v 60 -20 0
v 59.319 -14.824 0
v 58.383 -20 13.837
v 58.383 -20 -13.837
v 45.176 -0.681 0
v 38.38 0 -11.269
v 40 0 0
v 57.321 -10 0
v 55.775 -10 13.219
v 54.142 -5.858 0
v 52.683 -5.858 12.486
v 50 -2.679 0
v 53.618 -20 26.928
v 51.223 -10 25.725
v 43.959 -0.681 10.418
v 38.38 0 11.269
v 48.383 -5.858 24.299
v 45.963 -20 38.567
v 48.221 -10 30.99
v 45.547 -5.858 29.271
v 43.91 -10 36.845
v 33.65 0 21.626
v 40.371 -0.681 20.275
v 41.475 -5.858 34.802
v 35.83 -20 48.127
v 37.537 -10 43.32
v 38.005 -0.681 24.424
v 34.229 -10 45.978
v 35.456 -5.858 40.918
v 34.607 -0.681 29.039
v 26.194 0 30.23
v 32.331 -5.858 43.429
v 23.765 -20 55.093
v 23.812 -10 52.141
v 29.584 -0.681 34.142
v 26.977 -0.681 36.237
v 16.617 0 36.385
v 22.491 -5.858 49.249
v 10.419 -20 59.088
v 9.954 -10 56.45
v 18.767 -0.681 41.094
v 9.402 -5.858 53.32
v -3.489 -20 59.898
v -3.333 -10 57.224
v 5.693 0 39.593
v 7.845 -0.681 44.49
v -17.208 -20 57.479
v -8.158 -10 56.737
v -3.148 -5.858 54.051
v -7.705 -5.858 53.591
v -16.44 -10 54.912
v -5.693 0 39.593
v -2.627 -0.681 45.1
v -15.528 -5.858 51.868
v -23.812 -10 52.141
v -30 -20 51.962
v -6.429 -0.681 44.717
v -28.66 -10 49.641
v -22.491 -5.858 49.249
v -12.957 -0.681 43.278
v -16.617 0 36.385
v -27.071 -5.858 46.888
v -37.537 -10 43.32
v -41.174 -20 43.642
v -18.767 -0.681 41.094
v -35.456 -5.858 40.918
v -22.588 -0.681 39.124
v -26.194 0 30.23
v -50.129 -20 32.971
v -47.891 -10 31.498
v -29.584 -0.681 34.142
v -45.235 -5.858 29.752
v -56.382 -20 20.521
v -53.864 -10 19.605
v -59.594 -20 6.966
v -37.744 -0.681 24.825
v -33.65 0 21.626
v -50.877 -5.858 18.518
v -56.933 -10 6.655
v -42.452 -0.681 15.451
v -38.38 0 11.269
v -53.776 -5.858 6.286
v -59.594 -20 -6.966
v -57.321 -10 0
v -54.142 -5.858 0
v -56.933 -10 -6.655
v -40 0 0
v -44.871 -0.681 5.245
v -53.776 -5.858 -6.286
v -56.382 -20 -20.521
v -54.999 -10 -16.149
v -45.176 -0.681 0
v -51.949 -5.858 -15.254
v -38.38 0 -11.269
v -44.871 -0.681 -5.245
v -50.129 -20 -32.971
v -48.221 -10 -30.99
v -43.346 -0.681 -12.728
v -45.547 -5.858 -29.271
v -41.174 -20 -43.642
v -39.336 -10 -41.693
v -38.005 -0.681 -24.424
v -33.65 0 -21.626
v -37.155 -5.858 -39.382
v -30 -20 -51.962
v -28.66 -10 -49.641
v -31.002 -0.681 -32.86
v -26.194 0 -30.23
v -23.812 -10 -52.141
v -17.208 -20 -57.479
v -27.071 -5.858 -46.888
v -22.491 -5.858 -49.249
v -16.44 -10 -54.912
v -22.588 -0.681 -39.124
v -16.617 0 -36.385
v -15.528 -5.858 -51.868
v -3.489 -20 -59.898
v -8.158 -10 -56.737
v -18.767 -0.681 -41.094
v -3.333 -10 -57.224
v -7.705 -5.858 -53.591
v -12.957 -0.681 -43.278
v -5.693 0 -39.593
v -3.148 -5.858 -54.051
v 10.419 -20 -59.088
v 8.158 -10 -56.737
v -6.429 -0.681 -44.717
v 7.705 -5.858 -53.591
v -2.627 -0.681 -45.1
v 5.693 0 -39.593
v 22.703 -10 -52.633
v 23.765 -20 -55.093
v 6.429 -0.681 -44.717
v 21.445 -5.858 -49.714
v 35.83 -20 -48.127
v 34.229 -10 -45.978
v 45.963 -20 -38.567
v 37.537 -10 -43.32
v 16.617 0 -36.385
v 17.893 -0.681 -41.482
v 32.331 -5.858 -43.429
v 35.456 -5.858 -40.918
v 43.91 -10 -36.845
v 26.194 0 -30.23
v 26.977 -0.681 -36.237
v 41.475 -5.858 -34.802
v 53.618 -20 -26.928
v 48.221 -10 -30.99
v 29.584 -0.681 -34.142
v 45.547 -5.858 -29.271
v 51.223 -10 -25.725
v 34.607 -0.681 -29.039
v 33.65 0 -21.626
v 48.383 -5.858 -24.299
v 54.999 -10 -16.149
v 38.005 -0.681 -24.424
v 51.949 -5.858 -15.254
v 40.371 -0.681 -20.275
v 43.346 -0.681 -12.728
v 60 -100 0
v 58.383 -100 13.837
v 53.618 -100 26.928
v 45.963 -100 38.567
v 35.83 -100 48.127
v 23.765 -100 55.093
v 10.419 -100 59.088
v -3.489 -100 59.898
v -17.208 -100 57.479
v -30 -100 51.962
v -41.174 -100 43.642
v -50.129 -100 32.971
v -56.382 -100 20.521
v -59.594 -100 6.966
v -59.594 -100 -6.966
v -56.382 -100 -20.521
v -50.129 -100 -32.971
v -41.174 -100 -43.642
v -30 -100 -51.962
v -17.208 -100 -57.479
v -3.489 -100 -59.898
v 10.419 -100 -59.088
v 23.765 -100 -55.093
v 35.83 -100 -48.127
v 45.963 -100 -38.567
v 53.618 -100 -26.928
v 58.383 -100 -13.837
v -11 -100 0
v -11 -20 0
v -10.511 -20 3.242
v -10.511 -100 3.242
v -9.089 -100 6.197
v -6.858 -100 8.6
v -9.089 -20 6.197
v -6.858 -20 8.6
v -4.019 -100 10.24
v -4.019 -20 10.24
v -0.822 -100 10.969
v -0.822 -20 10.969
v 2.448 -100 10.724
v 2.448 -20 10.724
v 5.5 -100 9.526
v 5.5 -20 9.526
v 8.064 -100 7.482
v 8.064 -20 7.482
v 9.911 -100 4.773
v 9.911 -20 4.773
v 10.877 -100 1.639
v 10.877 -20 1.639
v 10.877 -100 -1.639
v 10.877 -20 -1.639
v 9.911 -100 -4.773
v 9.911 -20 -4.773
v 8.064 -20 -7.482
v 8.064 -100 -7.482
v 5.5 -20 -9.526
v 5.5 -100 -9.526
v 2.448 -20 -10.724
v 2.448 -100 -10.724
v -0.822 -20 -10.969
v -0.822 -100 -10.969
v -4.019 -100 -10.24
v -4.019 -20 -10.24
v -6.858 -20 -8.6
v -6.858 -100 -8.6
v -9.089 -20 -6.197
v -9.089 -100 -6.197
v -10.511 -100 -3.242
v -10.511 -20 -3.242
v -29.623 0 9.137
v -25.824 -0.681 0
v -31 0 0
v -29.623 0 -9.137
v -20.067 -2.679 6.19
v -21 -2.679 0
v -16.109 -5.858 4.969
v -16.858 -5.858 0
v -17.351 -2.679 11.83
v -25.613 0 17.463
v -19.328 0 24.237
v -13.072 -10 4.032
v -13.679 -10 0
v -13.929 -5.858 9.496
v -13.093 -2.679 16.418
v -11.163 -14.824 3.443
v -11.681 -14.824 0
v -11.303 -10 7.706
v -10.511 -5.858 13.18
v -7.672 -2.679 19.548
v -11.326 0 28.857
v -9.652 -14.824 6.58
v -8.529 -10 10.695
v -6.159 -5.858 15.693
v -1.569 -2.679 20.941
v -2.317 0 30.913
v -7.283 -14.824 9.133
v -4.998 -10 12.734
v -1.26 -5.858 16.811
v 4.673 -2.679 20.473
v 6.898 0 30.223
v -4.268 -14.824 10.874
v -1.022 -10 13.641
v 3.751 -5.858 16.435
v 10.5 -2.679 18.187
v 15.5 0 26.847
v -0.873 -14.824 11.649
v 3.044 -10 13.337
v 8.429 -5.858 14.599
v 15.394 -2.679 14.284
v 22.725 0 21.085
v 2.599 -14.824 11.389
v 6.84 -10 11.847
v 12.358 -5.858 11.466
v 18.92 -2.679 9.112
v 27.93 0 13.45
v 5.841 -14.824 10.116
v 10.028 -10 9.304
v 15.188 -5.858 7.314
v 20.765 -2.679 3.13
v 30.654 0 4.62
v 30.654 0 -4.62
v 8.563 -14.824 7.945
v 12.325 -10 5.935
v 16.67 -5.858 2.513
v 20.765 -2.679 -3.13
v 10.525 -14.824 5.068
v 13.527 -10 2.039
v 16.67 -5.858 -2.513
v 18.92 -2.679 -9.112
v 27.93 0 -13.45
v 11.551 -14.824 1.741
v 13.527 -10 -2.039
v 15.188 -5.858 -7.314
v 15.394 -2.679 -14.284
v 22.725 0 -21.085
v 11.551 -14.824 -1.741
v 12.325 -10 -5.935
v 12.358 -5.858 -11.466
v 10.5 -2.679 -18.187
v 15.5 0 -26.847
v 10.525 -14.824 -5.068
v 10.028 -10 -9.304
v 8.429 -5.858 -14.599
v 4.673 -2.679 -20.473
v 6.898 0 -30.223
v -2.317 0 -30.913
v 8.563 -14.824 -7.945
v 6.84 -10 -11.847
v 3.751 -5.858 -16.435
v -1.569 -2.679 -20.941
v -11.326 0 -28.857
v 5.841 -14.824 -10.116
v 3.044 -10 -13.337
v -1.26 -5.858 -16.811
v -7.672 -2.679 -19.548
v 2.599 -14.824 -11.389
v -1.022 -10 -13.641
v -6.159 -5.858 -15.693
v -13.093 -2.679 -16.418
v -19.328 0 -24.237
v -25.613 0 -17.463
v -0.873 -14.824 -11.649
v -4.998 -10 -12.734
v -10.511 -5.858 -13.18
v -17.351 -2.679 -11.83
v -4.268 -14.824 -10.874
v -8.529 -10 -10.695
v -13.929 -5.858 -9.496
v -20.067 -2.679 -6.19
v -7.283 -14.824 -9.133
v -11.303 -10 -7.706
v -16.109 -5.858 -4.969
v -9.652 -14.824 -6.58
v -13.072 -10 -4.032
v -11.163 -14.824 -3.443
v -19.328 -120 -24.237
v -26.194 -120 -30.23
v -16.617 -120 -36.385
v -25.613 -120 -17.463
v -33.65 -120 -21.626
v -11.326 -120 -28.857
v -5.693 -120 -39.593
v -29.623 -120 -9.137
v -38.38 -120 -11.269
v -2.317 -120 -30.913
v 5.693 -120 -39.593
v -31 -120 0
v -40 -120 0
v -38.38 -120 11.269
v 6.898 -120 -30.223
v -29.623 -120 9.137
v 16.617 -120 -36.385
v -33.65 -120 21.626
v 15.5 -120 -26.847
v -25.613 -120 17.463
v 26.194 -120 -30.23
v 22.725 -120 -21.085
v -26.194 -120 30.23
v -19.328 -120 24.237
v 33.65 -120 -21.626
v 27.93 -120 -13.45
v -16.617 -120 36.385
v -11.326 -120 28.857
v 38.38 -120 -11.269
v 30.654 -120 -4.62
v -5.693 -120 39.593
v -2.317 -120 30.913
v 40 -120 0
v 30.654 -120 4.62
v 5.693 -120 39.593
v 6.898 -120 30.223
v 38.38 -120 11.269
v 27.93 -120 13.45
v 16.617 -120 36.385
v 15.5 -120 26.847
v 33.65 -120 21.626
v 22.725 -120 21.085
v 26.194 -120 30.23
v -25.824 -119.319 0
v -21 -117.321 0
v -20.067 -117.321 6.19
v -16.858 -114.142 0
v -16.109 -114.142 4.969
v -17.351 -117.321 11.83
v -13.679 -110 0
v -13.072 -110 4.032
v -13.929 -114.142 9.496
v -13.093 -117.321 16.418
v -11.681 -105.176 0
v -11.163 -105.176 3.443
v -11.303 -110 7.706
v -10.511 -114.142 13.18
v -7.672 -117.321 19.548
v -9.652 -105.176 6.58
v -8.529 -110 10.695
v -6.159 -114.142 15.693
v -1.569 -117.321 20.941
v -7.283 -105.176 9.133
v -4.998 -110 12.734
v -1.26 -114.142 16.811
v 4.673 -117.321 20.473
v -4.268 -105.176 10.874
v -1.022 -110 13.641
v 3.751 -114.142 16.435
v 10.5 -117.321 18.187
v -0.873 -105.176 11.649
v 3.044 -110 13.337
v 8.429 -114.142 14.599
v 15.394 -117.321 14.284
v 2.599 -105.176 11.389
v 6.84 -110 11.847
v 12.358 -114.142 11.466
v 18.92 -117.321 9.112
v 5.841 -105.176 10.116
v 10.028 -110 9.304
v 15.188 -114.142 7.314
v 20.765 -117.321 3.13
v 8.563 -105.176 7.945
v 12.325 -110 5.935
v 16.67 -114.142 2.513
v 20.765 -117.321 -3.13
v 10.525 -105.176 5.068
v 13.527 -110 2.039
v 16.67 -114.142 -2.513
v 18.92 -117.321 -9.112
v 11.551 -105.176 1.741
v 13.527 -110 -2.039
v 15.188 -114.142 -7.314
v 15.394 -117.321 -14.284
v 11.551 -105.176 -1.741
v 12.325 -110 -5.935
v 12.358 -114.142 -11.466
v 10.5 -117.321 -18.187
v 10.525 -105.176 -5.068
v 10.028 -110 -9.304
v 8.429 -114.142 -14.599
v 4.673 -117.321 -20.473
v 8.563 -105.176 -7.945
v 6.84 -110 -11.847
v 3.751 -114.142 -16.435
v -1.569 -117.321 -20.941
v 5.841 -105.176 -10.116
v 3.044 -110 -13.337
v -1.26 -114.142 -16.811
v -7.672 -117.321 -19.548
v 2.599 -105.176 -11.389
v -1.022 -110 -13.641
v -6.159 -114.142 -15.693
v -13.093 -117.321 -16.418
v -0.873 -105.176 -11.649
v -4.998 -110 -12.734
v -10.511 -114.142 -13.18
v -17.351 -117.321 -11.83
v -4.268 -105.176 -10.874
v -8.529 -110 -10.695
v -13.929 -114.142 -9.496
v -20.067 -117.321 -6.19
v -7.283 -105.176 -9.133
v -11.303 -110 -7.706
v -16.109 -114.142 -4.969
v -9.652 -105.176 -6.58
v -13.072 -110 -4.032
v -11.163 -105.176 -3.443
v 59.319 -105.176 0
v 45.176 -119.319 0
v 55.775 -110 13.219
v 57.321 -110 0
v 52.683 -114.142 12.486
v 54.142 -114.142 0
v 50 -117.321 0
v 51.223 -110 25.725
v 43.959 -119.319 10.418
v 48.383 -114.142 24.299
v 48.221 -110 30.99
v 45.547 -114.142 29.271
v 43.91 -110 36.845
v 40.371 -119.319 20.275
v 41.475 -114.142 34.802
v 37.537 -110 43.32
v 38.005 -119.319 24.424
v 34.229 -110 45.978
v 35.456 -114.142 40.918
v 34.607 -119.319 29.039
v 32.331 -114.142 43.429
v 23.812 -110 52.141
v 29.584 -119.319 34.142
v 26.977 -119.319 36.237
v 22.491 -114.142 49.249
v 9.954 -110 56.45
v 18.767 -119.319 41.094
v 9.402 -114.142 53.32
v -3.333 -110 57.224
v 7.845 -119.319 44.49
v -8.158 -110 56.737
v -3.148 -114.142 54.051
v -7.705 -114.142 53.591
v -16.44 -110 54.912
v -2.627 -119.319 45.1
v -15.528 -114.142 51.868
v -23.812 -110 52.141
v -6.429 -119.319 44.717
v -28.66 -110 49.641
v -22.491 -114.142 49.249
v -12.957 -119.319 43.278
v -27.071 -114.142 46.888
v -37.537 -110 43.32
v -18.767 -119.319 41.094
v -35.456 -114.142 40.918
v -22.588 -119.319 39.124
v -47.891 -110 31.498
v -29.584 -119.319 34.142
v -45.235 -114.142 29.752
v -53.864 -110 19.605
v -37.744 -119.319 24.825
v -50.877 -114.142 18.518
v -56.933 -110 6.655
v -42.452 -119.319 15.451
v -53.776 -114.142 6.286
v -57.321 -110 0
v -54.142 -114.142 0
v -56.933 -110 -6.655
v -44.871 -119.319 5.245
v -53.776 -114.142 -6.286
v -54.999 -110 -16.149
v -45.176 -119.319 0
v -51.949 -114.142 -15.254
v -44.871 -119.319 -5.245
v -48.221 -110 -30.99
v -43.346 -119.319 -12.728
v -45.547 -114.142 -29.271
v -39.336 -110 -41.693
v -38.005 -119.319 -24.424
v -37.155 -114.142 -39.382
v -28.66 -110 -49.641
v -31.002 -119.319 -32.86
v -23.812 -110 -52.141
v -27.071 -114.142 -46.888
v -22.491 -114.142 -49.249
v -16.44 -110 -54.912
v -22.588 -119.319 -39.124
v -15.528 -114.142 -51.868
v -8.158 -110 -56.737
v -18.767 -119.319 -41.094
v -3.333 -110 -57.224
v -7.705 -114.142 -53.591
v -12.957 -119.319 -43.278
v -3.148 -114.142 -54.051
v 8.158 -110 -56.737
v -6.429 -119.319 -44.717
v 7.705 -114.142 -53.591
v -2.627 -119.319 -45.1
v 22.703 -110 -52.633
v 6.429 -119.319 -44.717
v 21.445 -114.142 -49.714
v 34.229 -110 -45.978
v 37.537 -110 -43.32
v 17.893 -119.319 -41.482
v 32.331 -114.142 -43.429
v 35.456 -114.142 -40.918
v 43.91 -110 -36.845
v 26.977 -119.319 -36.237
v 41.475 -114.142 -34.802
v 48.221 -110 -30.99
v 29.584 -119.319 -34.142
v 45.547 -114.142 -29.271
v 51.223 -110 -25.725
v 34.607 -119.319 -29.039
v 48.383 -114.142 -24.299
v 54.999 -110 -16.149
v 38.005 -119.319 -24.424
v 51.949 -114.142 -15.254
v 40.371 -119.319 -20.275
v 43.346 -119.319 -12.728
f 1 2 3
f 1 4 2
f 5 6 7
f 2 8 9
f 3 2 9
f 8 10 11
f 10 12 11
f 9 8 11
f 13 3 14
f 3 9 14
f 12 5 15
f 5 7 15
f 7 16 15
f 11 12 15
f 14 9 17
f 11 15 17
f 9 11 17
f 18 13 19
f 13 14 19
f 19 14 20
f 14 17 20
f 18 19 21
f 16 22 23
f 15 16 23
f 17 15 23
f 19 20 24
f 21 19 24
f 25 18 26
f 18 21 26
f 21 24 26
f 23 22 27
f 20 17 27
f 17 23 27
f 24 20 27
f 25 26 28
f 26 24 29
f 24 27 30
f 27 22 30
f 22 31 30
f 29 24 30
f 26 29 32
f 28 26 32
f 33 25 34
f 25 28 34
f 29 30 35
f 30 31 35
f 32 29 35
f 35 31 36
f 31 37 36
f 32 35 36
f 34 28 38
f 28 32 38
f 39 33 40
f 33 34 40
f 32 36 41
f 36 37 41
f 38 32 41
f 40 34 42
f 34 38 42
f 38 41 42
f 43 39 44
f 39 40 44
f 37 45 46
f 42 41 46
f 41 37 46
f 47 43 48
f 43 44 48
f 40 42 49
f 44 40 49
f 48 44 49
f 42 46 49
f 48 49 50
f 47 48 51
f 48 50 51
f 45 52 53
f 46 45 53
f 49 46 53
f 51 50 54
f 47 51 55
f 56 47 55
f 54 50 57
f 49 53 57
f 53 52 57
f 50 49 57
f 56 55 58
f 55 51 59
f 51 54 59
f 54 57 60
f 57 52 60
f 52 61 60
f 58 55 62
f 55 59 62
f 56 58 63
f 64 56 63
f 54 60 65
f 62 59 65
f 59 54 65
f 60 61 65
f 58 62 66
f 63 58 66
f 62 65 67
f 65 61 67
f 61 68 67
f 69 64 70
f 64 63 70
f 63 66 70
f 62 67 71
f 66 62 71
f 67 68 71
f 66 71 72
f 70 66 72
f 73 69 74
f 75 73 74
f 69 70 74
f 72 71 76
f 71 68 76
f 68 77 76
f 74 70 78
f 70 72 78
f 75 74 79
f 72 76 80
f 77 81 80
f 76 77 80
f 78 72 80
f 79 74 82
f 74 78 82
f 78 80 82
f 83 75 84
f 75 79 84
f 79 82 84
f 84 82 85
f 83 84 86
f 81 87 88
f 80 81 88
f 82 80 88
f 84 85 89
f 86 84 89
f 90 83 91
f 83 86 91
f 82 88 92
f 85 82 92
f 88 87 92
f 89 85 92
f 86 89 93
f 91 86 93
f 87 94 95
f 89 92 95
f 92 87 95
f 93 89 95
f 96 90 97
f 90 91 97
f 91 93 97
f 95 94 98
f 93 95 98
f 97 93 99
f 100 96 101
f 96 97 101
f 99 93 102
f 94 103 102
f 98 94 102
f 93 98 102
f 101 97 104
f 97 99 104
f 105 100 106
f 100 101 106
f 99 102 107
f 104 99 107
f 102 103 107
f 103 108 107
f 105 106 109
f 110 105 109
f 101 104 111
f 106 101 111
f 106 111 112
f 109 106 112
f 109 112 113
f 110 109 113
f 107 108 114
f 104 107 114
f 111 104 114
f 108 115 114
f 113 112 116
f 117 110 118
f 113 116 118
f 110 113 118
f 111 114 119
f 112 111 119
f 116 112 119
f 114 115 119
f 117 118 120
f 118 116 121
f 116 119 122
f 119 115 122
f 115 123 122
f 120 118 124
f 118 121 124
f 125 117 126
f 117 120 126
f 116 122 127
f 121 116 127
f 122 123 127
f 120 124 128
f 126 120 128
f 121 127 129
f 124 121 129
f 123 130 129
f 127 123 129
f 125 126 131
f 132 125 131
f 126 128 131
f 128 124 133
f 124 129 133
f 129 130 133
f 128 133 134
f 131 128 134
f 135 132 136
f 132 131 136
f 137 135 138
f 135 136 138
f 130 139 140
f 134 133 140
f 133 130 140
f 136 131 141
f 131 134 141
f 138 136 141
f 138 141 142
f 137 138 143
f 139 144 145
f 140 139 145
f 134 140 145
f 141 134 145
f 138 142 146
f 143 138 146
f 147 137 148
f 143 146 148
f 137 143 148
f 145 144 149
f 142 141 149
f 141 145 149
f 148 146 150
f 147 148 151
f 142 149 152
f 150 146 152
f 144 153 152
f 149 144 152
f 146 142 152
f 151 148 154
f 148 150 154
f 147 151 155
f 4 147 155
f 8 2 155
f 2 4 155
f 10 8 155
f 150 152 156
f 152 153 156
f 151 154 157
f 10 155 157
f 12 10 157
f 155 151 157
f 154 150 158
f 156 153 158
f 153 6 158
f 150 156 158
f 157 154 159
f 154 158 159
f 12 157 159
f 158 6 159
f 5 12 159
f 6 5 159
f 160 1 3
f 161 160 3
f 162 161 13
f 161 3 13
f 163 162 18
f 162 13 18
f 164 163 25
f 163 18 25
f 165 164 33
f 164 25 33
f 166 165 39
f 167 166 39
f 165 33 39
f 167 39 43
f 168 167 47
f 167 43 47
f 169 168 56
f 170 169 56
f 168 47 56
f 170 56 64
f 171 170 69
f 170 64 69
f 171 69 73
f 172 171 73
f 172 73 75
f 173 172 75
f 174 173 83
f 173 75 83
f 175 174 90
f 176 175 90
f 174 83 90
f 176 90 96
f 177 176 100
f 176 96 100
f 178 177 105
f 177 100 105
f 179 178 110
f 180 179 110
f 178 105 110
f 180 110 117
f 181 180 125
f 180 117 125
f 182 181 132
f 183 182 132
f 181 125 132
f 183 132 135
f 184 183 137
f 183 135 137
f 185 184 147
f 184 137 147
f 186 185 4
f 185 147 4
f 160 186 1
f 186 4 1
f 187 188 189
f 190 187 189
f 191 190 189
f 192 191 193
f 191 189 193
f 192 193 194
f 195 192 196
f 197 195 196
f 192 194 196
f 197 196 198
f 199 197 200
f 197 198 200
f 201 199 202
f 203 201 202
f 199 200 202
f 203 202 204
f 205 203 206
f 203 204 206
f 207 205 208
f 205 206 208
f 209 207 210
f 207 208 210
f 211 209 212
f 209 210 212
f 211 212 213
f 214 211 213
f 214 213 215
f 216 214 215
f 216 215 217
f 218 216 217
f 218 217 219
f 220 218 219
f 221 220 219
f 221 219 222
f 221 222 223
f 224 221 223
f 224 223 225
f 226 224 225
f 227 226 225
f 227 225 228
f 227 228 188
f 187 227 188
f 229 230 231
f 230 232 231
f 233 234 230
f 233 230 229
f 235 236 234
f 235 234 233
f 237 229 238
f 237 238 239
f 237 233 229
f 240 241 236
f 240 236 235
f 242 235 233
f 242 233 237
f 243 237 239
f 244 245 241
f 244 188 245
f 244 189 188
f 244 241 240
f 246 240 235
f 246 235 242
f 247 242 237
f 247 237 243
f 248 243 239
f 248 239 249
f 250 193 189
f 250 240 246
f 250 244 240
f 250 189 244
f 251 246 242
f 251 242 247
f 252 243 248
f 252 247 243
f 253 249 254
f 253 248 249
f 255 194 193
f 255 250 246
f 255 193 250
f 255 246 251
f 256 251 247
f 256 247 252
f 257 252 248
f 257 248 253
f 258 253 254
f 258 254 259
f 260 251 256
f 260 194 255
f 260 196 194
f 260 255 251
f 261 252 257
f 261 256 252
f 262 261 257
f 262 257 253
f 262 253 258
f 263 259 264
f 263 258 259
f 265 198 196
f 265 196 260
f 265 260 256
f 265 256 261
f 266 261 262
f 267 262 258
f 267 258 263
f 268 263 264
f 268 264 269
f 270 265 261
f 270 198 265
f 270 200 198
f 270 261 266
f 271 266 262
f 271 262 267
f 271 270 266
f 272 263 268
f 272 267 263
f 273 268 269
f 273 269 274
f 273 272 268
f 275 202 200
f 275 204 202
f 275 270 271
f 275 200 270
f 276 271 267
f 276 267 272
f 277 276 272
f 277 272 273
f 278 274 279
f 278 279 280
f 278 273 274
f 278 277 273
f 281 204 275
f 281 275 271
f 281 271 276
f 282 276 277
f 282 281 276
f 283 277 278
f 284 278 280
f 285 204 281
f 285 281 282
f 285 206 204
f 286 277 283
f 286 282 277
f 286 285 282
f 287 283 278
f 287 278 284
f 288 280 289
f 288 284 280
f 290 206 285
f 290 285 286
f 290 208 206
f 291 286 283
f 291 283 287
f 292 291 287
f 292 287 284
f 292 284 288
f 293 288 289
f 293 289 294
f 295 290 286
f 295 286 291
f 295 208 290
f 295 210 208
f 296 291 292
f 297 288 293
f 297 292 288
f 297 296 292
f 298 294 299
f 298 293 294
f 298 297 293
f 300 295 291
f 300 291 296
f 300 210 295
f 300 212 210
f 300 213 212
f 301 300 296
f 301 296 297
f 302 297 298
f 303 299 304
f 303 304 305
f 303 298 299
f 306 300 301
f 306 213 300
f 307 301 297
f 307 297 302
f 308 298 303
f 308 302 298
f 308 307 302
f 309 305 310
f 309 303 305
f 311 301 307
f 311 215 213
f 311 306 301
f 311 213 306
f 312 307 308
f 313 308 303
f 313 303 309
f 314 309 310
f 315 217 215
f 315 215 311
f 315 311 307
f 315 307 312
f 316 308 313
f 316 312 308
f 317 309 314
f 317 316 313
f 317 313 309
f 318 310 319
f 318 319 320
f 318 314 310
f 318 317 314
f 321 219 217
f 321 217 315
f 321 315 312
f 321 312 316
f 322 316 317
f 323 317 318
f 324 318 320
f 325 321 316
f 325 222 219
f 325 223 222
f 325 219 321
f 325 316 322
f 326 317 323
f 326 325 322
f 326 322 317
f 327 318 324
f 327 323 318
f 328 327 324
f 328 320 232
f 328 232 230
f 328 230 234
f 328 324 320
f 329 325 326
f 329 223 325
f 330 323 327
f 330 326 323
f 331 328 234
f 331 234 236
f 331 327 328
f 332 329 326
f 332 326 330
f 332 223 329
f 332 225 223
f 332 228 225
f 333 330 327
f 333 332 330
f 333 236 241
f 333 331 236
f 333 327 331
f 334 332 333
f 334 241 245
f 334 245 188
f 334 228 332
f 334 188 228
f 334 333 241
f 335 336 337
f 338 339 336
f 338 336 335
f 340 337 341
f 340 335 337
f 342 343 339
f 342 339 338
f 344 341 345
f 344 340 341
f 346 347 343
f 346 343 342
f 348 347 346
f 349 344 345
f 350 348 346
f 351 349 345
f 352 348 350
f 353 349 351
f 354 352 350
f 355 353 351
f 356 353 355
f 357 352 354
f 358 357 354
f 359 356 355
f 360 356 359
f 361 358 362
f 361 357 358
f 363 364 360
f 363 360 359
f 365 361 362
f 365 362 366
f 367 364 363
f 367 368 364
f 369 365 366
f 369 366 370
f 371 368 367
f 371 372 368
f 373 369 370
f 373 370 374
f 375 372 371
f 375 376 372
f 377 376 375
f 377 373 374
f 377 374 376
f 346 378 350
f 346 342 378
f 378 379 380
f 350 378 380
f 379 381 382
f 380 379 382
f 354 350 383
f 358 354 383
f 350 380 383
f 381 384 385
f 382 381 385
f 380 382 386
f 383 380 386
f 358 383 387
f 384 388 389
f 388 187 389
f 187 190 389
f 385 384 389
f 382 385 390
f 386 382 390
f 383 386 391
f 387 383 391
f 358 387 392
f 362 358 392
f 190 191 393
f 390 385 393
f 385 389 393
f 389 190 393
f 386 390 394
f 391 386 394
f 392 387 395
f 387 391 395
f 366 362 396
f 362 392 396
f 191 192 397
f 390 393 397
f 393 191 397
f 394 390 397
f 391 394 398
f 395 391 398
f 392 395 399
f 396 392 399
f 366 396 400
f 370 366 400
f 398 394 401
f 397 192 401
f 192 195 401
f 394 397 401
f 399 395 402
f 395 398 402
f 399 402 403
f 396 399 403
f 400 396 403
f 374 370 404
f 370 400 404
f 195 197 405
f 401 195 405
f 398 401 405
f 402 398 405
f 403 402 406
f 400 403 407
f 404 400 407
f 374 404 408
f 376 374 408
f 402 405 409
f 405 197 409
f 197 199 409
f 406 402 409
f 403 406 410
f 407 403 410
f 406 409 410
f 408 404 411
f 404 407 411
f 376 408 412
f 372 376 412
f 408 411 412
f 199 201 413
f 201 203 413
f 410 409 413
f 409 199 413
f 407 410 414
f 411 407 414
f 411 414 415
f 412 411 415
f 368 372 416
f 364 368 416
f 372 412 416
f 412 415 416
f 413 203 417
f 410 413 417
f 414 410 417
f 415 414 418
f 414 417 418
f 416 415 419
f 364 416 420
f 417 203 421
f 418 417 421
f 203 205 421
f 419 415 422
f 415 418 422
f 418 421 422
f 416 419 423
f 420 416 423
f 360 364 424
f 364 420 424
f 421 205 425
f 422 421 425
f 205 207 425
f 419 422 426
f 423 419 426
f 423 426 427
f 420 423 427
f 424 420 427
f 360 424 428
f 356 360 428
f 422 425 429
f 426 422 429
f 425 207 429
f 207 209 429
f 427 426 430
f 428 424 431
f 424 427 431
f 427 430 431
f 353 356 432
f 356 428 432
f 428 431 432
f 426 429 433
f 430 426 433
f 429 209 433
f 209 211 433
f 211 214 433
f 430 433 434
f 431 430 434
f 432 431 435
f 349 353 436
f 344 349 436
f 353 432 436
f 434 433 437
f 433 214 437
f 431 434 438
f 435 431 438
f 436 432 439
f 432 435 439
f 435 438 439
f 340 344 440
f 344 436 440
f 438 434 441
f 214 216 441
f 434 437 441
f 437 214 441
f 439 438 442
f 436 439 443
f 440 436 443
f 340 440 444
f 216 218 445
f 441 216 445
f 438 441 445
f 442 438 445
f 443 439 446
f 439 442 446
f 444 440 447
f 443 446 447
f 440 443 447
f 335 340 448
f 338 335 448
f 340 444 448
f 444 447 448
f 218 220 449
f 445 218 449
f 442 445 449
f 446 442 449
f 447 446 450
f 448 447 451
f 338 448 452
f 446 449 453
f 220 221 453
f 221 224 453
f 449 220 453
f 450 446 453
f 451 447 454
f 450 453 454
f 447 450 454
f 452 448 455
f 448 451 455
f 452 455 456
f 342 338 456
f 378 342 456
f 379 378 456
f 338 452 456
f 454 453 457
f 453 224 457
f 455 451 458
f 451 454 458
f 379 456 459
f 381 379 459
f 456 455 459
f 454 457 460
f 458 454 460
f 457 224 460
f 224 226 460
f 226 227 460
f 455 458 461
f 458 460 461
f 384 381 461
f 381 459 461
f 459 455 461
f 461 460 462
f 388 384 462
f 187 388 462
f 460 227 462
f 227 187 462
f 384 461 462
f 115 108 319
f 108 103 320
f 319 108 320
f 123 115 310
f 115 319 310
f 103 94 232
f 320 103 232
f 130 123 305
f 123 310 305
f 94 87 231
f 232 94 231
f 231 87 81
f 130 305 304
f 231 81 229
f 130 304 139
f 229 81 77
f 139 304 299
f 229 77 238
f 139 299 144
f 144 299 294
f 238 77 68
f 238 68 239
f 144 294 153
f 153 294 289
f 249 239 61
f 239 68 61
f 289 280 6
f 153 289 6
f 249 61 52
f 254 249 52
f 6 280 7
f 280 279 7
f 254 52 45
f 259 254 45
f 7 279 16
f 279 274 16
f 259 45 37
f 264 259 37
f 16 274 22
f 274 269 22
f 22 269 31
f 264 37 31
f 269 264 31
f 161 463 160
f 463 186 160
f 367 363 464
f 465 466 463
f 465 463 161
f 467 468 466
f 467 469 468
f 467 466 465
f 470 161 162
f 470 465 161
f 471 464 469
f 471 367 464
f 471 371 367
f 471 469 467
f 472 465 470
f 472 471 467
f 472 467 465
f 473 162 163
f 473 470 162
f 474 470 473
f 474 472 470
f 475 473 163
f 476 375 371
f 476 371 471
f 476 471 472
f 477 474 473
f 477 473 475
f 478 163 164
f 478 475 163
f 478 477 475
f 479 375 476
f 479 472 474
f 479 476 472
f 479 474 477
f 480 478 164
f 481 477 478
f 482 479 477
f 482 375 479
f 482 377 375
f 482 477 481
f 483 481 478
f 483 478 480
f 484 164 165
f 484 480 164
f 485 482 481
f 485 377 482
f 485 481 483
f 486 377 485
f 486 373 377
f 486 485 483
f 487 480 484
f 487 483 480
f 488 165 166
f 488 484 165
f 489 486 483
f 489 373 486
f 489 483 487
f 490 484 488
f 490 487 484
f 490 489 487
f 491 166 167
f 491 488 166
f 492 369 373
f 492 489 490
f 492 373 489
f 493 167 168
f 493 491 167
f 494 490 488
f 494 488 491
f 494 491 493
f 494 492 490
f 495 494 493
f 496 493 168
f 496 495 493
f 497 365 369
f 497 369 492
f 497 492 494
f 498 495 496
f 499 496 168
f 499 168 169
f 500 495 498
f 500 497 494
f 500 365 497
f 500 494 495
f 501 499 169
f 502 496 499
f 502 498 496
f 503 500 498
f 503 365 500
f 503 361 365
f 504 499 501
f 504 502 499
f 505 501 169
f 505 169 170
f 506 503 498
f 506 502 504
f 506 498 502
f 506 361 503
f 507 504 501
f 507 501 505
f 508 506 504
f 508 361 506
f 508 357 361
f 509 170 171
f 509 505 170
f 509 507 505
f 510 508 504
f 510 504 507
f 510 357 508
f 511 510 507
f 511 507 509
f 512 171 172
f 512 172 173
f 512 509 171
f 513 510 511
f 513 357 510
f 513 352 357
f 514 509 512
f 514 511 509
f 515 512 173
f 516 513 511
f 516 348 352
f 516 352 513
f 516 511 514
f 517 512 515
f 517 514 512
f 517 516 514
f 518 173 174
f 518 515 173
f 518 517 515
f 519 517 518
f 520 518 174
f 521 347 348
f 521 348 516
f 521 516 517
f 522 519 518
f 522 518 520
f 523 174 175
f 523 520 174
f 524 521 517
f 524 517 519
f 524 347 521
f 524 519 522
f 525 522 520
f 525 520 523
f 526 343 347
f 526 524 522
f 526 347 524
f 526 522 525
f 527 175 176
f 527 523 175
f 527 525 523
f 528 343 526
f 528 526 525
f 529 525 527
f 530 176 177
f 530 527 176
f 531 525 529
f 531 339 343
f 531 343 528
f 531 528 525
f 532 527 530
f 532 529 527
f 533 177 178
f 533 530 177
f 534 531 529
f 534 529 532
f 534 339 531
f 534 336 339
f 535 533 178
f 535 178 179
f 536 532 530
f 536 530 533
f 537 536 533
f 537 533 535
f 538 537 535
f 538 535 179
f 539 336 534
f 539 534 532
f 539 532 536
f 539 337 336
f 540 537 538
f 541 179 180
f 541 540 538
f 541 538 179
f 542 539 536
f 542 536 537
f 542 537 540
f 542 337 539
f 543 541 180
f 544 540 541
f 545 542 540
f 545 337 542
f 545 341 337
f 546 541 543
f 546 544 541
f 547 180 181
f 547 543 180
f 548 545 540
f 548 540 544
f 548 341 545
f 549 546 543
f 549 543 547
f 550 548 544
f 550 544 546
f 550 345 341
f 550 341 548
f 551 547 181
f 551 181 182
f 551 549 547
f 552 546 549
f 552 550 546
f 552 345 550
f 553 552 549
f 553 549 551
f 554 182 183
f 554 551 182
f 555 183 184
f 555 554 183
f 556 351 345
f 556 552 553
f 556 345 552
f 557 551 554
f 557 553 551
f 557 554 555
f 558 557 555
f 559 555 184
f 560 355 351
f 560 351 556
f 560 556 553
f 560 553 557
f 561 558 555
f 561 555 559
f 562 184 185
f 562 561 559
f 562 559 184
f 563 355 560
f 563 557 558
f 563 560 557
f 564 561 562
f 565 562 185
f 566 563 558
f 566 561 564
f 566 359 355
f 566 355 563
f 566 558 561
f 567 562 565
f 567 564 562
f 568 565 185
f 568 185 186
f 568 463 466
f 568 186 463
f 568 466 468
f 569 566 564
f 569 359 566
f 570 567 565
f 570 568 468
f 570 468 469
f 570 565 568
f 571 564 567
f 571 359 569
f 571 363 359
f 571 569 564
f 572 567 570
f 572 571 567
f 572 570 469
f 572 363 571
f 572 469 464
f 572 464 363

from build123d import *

# Parameters (mm, degrees)
F0_R     = 60
F1_DEPTH = 120
F3_D     = 22
F4_R     = 20


with BuildPart() as f1:
    # F0 (on Front) → F1 (new body)
    with BuildSketch(Plane.XZ):
        Circle(F0_R)
    extrude(amount=F1_DEPTH)

    # F3 (through all)
    with Locations(Plane.XZ.offset(120)):
        with Locations((0, 0)):
            Hole(F3_D / 2)

    # F4
    f4_edges = [f1.edges().sort_by_distance(p)[0] for p in [
        (60, -60, 0),
        (-60, 0, 0),
        (-60, -120, 0),
        (-11, 0, 0),
        (-11, -120, 0),
    ]]
    fillet(f4_edges, radius=F4_R)


solid = f1.part
